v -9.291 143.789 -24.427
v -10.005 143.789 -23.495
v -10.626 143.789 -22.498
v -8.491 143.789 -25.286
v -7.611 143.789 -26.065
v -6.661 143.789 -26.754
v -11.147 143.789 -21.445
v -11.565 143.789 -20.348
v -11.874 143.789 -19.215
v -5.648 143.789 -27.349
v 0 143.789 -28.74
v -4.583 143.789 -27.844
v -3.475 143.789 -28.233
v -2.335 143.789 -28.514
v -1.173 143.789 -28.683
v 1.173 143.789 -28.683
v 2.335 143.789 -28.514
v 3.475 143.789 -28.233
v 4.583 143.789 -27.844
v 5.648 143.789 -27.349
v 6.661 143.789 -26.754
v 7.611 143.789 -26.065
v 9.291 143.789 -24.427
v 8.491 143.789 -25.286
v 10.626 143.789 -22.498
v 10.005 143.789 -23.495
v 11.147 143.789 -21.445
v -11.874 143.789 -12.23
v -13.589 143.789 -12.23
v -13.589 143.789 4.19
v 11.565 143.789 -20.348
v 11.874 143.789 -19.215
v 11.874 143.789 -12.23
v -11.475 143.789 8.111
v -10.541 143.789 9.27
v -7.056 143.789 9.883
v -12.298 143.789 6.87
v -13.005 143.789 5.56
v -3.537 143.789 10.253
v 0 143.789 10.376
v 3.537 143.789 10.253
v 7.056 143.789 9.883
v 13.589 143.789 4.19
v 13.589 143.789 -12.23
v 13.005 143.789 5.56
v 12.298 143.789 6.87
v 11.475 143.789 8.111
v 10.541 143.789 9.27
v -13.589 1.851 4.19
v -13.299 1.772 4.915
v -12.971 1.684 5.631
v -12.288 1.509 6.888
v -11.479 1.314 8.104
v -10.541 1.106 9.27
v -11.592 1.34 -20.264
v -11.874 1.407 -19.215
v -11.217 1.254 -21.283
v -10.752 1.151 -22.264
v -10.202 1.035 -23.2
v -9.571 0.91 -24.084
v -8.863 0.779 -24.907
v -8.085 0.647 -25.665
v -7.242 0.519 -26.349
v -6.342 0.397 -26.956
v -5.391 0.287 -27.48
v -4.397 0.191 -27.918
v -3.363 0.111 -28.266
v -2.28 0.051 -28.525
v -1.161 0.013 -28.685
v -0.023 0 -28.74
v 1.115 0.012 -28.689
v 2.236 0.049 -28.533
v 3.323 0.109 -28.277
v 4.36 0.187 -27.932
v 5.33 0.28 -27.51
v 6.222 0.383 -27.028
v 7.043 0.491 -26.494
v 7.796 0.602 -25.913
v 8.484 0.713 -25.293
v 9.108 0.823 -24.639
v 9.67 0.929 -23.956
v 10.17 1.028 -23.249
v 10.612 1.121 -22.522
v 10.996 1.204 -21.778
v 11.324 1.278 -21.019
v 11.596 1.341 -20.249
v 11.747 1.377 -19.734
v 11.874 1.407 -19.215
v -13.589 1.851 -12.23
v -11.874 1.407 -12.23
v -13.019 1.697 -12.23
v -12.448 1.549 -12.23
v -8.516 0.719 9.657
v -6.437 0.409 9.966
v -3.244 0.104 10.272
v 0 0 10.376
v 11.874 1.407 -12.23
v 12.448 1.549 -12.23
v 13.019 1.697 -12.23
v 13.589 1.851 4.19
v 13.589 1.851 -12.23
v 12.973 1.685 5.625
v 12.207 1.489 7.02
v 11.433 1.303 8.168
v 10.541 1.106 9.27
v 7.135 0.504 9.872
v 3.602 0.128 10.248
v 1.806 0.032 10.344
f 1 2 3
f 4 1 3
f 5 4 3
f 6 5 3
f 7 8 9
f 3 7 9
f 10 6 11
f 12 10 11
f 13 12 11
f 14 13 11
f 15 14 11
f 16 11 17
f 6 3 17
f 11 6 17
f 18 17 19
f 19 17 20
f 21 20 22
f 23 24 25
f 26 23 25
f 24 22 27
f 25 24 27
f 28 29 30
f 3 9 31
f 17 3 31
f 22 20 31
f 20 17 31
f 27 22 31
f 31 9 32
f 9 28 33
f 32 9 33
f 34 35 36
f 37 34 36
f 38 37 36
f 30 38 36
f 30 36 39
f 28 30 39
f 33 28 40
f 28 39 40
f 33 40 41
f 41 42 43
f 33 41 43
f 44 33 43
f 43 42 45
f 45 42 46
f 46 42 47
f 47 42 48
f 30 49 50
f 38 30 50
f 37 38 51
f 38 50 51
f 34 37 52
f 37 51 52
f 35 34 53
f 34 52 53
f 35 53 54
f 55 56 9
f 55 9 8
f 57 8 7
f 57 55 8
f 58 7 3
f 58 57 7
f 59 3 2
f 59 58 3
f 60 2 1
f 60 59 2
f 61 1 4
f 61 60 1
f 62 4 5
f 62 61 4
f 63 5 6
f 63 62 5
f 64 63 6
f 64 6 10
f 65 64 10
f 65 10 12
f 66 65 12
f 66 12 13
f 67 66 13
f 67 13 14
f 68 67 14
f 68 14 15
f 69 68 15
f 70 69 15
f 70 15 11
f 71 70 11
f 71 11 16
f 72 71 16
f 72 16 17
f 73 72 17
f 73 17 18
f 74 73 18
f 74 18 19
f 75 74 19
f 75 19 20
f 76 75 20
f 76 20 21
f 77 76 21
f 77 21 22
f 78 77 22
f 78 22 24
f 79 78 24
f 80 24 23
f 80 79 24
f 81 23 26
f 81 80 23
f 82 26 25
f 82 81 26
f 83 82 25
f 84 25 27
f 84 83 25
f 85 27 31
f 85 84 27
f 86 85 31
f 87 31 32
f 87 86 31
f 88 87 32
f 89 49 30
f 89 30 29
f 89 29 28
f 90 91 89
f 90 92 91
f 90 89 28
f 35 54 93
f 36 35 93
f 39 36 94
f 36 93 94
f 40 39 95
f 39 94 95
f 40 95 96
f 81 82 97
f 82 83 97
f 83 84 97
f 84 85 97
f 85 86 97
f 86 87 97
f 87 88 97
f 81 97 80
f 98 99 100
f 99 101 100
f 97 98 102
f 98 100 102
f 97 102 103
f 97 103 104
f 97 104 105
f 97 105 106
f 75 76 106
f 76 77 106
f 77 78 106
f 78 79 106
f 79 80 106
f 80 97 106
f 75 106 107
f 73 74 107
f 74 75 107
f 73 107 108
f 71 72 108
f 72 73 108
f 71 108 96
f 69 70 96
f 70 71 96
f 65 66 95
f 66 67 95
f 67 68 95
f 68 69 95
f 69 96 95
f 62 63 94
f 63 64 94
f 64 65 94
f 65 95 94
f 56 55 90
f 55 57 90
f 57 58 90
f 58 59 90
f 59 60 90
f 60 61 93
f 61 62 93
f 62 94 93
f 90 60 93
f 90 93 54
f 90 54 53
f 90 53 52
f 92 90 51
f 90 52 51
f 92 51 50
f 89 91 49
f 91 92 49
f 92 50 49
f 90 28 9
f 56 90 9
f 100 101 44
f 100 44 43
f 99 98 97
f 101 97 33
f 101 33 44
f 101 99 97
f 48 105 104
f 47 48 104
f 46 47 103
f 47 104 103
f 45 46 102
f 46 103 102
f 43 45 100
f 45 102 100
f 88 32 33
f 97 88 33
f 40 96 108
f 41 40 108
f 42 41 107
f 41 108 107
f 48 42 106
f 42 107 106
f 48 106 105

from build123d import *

# Parameters (mm, degrees)
F1_DEPTH = 143.7894
F3_DEPTH = 143.7904
F5_DEPTH = 38.1


with BuildPart() as f1:
    # F0 (on Front) → F1 (new body)
    with BuildSketch(Plane.XZ):
        with BuildLine():
            Line((13.589, 10.3759), (-13.589, 10.3759))
            Line((-13.589, 10.3759), (-13.589, -12.2301))
            Line((-13.589, -12.2301), (-11.8745, -12.2301))
            Line((-11.8745, -12.2301), (-11.8745, -19.2151))
            ThreePointArc((-11.8745, -19.2151), (0, -28.7401), (11.8745, -19.2151))
            Line((11.8745, -19.2151), (11.8745, -12.2301))
            Line((11.8745, -12.2301), (13.589, -12.2301))
            Line((13.589, -12.2301), (13.589, 10.3759))
        make_face()
    extrude(amount=-F1_DEPTH)

    # F2 (on face) → F3 (cut, through all)
    with BuildSketch(Plane.XZ):
        with BuildLine():
            ThreePointArc((-10.541, 9.270239), (-5.299414, 10.098729), (0, 10.3759))
            ThreePointArc((0, 10.3759), (5.299414, 10.098729), (10.541, 9.270239))
            ThreePointArc((10.541, 9.270239), (12.298376, 6.870264), (13.589, 4.190239))
            Line((13.589, 4.190239), (13.589, 18.64491))
            Line((13.589, 18.64491), (-13.877228, 18.64491))
            Line((-13.877228, 18.64491), (-13.589, 4.190239))
            ThreePointArc((-13.589, 4.190239), (-12.298376, 6.870264), (-10.541, 9.270239))
        make_face()
    extrude(amount=-F3_DEPTH, mode=Mode.SUBTRACT)

    # F4 (on Top) → F5 (cut, symmetric)
    with BuildSketch(Plane.XY):
        with BuildLine():
            ThreePointArc((13.589, 1.851261), (0, 0), (-13.589, 1.851261))
            Line((-13.589, 1.851261), (-13.589, -7.918205))
            Line((-13.589, -7.918205), (13.589, -7.918205))
            Line((13.589, -7.918205), (13.589, 1.851261))
        make_face()
    extrude(amount=F5_DEPTH, both=True, mode=Mode.SUBTRACT)


solid = f1.part
